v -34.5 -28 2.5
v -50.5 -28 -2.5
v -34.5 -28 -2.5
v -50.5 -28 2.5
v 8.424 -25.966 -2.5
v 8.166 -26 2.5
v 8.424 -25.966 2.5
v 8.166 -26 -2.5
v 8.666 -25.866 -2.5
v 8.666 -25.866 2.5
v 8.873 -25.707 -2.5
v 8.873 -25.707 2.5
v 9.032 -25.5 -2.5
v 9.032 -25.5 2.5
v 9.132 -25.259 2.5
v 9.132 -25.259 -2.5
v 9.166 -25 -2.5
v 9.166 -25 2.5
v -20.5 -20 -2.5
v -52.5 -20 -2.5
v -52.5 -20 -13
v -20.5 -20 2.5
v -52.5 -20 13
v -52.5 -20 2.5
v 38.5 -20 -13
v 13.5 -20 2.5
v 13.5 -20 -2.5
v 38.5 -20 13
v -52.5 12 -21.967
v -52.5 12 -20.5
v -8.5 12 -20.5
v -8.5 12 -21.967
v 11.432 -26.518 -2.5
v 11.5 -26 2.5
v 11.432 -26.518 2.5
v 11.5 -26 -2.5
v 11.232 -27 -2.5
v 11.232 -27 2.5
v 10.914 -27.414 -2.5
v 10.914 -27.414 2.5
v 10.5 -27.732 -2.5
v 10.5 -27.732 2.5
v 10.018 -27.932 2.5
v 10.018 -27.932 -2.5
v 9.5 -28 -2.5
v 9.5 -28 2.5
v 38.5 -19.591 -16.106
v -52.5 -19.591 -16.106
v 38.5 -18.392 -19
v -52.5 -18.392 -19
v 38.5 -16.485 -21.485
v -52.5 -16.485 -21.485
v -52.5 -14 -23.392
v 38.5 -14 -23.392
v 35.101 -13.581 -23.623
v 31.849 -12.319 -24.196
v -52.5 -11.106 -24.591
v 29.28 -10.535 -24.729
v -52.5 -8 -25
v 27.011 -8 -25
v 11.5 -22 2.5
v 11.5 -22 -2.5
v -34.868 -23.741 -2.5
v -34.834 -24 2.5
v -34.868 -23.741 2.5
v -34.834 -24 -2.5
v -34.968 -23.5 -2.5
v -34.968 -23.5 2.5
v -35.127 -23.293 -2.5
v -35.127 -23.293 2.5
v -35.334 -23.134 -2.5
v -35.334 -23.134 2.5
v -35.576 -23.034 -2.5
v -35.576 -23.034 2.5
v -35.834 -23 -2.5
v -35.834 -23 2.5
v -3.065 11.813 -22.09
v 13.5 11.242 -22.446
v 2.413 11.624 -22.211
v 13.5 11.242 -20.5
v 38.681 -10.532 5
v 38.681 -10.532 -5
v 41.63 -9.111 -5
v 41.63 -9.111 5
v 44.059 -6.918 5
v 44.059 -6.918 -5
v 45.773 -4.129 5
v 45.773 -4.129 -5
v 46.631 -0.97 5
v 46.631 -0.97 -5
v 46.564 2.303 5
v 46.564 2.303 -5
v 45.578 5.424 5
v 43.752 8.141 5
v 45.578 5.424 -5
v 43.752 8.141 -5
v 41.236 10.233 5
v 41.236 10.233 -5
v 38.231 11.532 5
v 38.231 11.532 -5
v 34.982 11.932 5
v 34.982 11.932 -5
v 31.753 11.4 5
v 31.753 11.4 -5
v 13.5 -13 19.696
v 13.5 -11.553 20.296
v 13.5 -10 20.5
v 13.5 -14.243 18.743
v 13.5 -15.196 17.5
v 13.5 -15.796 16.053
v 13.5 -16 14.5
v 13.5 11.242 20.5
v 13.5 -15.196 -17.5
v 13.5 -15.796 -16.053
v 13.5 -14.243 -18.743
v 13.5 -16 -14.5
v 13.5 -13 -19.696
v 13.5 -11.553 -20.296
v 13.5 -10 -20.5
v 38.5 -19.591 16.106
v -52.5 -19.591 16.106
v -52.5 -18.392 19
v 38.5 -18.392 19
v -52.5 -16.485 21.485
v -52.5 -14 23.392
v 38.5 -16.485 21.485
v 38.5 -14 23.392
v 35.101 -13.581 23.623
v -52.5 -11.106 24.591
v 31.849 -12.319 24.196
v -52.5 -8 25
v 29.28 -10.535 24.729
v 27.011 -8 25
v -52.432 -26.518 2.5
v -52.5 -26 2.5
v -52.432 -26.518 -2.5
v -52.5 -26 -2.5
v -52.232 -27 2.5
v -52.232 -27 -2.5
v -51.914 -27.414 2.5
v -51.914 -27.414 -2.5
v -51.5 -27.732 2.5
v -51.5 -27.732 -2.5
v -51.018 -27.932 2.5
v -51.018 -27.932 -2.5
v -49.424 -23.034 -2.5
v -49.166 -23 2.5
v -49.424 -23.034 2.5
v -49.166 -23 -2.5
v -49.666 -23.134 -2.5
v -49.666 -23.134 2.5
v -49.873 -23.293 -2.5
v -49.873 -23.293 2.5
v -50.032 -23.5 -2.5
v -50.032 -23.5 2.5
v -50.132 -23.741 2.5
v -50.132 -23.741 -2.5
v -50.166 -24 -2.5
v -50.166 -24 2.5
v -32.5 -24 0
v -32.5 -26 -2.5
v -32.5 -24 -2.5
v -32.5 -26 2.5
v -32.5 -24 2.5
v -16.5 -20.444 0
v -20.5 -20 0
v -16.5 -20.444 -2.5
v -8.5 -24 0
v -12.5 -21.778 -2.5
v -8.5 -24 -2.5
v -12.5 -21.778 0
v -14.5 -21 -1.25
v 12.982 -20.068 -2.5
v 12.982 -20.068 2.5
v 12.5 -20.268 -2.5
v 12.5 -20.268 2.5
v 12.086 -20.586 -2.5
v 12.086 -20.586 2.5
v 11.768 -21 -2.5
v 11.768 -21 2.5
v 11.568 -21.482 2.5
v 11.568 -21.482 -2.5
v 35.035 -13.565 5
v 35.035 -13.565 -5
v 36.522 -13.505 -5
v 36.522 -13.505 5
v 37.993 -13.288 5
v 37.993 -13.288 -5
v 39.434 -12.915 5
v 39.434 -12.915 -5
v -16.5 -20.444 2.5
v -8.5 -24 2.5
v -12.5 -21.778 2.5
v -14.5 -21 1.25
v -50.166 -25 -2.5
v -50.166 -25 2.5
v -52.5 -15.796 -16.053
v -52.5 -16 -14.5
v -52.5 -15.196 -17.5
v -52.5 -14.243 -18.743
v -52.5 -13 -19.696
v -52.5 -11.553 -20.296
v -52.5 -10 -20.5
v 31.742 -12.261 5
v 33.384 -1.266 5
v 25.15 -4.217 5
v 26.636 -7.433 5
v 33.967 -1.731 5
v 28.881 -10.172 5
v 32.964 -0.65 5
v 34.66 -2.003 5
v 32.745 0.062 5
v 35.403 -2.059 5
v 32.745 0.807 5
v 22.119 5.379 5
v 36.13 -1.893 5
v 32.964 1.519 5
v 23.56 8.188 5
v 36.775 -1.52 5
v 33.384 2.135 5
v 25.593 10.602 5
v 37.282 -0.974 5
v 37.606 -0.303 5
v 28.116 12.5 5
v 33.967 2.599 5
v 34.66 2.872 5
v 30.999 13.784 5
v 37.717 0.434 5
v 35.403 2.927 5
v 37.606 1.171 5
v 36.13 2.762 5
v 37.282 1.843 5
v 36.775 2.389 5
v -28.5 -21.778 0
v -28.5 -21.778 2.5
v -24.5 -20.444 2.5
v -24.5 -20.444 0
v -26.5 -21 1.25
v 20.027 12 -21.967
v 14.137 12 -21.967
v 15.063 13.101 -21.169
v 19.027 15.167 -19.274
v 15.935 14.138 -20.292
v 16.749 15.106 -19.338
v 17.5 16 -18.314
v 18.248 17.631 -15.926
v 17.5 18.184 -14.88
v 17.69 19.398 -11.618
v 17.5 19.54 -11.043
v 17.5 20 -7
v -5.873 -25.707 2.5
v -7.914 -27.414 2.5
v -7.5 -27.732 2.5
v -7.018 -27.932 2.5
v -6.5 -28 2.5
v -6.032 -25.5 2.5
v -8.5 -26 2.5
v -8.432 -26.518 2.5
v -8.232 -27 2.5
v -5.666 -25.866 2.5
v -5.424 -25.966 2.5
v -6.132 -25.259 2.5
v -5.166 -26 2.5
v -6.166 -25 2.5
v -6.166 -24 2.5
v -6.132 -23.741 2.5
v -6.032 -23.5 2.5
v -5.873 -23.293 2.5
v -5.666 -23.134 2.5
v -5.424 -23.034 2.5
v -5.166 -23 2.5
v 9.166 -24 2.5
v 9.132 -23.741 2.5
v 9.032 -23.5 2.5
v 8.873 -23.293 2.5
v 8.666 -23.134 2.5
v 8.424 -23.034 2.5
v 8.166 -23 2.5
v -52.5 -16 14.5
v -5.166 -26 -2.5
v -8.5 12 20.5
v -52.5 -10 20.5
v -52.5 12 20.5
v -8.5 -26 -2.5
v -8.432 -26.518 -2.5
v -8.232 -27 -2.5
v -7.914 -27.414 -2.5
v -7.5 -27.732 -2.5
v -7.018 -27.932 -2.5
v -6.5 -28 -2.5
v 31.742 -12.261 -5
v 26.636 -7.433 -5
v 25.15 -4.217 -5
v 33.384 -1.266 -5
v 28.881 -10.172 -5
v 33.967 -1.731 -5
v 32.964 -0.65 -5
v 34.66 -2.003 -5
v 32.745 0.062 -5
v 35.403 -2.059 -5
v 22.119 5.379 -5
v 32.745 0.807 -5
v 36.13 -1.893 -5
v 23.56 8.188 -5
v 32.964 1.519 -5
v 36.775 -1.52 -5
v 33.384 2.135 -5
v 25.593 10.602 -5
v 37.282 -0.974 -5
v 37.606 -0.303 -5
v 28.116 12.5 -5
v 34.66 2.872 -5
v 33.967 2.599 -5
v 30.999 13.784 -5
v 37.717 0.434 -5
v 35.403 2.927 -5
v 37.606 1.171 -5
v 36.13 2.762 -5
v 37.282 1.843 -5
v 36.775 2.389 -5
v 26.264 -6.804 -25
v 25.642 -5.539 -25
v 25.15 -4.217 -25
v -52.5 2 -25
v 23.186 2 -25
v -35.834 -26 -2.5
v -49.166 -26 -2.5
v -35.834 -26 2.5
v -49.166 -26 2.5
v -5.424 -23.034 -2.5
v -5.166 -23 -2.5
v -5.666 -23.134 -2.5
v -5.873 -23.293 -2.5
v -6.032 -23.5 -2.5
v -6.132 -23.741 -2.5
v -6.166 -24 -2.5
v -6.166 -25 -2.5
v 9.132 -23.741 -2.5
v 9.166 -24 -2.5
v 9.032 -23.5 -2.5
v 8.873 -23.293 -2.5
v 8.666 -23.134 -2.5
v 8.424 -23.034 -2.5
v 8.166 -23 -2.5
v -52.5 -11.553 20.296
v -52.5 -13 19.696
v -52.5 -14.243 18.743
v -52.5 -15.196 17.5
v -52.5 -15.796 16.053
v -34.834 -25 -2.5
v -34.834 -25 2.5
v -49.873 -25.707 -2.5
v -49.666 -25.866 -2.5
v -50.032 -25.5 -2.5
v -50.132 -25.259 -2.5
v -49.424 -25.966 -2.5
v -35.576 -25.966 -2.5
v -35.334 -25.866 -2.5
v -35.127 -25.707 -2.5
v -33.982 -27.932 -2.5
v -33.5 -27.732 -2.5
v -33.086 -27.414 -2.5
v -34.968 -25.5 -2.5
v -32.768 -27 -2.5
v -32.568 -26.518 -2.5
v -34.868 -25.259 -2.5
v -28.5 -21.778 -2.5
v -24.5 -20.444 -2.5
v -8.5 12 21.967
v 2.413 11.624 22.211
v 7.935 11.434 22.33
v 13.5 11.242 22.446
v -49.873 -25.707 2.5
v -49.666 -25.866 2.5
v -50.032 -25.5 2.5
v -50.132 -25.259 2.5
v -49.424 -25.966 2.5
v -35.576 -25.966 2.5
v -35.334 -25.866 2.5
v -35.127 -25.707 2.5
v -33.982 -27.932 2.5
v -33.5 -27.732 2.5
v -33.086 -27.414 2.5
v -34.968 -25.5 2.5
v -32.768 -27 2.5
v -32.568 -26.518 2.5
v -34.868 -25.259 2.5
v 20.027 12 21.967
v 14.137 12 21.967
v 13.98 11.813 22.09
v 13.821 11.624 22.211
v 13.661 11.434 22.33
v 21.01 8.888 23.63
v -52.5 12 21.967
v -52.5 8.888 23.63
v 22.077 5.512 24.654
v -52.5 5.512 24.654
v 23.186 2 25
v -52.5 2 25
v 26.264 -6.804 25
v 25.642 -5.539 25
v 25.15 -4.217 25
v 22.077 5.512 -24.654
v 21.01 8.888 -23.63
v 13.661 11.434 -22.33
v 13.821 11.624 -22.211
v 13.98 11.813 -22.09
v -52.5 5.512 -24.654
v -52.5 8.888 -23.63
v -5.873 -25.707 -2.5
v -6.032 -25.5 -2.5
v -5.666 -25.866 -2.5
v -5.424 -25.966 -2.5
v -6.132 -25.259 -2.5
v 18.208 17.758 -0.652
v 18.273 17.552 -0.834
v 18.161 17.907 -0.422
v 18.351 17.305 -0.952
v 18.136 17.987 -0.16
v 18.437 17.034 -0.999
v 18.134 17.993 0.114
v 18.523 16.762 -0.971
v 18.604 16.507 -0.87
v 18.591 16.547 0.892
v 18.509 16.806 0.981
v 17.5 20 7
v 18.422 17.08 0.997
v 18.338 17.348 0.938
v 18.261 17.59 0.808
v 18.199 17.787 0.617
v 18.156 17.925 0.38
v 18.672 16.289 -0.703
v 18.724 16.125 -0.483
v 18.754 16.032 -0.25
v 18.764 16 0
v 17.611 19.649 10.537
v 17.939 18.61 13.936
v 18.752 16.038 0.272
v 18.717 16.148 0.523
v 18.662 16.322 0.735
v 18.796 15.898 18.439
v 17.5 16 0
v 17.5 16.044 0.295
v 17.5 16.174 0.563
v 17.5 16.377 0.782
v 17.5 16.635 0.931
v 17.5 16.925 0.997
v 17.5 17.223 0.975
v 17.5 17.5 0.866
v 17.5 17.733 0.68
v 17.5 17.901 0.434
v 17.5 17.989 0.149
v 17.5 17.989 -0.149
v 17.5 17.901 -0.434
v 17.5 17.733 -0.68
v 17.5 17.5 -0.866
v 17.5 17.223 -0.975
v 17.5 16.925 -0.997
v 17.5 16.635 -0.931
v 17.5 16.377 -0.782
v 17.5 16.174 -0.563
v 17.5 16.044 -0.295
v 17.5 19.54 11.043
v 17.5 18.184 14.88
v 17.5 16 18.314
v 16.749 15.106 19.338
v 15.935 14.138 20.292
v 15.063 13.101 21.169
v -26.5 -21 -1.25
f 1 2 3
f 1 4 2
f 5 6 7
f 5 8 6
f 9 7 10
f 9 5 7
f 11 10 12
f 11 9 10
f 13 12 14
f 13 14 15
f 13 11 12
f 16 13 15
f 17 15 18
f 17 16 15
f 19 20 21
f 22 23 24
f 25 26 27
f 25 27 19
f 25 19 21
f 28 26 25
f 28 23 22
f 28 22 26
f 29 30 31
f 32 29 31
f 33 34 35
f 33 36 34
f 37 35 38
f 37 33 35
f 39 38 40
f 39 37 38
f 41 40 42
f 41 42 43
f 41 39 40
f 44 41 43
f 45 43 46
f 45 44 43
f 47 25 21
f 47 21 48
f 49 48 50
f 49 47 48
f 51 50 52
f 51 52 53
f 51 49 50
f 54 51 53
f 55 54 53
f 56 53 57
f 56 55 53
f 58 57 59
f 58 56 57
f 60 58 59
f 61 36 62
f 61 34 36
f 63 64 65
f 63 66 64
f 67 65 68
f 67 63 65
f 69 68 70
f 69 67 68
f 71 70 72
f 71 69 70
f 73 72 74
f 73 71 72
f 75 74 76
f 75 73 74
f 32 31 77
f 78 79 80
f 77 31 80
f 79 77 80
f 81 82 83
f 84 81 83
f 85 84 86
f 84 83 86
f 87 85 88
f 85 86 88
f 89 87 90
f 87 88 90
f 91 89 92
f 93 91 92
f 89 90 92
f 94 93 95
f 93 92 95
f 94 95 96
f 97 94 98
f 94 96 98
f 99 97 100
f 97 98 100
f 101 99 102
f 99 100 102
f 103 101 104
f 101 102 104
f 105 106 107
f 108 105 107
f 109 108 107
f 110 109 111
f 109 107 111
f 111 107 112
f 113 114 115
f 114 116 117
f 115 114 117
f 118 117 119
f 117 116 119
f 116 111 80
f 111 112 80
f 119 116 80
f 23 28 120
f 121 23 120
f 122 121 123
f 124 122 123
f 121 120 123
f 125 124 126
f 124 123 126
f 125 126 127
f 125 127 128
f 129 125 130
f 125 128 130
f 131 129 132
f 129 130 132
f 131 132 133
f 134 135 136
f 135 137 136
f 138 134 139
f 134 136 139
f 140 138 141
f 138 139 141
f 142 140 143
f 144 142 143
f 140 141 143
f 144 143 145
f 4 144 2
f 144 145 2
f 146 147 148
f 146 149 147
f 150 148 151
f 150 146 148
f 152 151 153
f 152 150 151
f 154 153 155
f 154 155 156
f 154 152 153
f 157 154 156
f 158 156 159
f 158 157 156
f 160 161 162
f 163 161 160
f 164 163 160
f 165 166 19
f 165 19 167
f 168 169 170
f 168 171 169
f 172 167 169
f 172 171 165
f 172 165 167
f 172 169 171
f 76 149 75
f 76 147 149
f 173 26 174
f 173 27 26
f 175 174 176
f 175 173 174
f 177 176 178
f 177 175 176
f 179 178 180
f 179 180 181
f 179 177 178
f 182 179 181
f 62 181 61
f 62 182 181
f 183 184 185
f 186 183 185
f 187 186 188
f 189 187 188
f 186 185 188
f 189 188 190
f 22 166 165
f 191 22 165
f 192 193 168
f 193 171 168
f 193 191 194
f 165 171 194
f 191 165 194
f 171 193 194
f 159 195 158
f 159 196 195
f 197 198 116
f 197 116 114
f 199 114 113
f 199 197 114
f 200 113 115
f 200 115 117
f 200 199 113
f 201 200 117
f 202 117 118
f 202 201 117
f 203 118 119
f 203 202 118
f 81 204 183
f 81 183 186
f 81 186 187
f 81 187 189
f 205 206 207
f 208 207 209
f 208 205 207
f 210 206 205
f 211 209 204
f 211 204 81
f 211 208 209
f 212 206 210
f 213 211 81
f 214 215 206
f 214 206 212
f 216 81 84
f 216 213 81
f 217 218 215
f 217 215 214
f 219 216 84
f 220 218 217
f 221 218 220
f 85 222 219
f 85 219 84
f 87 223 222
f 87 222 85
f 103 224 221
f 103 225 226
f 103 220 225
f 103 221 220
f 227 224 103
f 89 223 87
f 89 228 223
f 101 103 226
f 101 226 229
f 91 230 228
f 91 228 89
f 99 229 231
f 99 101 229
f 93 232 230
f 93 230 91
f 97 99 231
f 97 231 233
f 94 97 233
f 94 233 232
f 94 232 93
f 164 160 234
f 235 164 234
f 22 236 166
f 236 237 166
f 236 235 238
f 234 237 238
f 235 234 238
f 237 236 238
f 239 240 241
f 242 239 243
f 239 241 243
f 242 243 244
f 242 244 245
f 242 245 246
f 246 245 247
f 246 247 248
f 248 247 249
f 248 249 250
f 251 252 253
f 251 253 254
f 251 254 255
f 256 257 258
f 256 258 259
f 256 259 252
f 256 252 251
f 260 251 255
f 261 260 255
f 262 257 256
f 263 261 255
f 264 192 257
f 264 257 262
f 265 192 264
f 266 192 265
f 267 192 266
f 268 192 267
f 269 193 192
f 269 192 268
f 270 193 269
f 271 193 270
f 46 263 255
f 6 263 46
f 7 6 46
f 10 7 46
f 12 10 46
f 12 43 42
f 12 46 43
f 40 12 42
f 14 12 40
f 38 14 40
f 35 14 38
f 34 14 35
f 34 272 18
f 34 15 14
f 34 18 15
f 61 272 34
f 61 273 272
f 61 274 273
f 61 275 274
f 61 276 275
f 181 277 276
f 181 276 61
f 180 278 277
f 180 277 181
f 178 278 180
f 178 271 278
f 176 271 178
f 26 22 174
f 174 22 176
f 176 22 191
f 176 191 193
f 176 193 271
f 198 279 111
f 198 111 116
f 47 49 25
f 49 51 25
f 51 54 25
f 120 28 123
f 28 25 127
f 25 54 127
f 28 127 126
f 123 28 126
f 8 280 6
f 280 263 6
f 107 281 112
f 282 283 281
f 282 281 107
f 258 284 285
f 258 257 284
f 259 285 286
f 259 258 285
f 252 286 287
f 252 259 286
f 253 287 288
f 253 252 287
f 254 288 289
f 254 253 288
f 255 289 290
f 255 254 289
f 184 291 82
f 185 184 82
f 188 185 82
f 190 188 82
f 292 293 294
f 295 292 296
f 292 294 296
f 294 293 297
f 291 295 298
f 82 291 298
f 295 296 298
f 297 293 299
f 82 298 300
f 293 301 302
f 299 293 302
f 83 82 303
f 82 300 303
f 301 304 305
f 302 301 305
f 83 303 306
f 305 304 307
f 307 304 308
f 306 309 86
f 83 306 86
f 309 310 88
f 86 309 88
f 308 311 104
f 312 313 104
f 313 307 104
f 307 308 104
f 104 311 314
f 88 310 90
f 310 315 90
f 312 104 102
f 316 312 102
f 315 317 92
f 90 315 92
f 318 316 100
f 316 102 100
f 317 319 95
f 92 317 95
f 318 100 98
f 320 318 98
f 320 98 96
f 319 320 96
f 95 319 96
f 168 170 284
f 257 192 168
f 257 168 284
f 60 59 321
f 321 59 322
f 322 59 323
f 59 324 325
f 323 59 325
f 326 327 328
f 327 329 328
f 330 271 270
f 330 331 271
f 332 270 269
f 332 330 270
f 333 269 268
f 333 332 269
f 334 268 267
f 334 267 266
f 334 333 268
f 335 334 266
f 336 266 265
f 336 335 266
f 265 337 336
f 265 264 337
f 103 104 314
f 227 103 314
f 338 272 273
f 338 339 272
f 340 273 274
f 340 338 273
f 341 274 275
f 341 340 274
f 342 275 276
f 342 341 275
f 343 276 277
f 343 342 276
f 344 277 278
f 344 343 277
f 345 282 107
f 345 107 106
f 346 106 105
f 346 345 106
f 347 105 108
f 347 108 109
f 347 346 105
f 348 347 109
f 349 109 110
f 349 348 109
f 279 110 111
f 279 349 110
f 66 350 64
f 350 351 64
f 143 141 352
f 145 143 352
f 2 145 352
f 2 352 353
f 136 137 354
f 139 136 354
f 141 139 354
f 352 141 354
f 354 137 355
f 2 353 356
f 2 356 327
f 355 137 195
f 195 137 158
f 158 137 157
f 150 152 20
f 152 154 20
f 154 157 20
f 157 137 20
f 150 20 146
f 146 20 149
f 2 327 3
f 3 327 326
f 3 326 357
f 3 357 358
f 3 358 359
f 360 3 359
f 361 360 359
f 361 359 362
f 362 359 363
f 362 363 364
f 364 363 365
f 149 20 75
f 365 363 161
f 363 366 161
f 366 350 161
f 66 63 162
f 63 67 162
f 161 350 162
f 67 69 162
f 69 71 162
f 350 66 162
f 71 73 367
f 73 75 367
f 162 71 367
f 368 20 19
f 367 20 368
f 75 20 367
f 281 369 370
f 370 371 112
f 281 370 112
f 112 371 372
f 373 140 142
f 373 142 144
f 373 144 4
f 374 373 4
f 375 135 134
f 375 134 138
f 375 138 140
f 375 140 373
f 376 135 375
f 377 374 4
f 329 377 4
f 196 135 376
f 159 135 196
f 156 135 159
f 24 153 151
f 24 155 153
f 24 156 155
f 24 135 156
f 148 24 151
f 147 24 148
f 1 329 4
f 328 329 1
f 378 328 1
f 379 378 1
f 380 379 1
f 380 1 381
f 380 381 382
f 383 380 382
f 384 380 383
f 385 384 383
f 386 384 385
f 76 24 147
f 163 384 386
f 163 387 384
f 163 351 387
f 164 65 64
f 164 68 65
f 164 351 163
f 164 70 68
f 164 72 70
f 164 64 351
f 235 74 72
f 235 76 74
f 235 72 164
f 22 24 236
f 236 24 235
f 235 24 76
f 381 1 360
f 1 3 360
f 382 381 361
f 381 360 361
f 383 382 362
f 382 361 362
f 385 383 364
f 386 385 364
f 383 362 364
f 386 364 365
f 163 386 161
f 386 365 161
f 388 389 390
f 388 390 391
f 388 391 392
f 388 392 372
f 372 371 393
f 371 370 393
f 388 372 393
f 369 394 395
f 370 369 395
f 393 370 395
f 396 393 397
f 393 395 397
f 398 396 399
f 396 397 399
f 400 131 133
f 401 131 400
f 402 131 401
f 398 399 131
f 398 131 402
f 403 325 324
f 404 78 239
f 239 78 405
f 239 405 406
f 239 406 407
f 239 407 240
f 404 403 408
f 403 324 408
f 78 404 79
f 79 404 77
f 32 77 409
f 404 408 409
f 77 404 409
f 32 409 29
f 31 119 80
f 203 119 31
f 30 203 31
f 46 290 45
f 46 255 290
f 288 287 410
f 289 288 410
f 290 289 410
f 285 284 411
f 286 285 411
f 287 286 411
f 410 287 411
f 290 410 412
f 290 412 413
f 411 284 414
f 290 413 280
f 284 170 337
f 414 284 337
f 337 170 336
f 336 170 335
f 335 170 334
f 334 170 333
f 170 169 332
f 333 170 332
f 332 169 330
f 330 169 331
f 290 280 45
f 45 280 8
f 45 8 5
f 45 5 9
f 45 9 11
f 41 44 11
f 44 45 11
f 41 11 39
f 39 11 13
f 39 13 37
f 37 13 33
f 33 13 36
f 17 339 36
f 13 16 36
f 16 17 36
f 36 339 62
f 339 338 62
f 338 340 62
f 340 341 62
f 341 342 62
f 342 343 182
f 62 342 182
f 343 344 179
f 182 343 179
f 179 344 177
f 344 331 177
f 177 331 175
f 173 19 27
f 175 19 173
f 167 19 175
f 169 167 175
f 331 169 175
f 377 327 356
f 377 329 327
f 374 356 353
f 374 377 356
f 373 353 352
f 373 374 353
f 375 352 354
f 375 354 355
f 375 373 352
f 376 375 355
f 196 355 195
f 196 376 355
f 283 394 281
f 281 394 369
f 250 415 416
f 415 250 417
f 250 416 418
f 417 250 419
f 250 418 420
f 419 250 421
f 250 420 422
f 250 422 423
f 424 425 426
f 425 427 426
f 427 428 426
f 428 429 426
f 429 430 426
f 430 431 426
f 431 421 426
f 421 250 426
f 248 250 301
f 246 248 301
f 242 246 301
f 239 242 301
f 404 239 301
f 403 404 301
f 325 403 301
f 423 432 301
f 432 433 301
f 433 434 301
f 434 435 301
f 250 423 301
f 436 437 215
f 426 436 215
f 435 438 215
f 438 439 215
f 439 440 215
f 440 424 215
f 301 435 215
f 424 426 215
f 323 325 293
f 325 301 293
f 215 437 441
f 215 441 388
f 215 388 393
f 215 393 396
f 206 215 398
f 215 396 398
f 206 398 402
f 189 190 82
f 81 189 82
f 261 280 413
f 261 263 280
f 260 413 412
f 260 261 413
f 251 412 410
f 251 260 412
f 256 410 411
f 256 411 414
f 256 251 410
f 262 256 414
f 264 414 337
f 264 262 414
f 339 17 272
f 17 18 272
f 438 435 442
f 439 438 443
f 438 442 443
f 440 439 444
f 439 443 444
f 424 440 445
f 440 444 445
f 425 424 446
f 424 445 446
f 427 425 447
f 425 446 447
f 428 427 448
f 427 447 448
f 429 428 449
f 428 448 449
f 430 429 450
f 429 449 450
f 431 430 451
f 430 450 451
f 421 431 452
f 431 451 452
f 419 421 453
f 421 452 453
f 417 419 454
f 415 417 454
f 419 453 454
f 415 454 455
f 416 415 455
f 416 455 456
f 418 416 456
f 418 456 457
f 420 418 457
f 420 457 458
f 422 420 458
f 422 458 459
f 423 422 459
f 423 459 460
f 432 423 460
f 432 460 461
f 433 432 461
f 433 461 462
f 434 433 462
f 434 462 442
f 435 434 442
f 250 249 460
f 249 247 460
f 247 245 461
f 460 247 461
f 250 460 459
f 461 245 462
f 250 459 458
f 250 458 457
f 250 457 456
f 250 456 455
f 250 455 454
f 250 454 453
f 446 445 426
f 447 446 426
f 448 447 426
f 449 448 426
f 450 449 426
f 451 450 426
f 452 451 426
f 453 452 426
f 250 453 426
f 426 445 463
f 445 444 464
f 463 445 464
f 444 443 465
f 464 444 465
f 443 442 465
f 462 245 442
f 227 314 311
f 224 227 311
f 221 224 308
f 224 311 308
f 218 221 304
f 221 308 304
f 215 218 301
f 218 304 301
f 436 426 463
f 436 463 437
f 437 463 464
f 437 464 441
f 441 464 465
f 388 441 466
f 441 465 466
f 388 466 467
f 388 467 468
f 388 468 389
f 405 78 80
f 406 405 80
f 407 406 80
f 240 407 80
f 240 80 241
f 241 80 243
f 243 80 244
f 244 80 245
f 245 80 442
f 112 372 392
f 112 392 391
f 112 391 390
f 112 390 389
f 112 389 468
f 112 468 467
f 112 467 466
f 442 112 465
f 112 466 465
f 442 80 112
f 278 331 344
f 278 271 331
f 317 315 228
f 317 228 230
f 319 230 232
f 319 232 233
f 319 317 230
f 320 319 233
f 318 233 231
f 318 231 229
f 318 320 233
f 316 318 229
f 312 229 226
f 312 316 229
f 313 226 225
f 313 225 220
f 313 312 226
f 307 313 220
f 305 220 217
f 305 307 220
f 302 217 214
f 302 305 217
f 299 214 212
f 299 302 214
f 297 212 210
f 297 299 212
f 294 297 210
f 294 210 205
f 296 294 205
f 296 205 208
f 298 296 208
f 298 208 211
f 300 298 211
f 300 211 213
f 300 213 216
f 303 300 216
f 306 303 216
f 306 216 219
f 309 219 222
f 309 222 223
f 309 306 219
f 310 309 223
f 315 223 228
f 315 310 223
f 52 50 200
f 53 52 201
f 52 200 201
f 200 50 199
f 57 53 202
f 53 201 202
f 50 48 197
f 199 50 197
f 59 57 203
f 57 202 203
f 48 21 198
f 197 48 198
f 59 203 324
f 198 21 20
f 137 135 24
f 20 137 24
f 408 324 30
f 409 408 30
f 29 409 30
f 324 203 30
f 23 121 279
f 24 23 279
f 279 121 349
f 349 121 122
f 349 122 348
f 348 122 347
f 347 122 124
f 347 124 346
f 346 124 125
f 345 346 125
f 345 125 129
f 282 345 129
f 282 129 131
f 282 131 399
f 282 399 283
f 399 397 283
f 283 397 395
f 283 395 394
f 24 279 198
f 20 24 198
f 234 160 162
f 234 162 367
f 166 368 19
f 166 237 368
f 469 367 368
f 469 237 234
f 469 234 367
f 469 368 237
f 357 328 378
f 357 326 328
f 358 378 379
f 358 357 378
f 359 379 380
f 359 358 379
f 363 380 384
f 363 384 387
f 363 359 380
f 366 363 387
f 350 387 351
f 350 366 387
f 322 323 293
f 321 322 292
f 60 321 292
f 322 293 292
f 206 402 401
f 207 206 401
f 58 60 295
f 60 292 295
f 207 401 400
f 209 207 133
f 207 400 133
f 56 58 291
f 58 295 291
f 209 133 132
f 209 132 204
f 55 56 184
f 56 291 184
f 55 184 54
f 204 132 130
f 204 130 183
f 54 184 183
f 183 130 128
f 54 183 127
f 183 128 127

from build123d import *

# Parameters (mm, degrees)
CROQUIS1_W              = 105
CROQUIS1_H              = 40
SALIENTE_EXTRUIR1_DEPTH = 25
CORTAR_EXTRUIR1_DEPTH   = 50
CORTAR_EXTRUIR2_DEPTH   = 50
CROQUIS6_R              = 2.5
SALIENTE_EXTRUIR3_DEPTH = 5
CORTAR_EXTRUIR3_DEPTH   = 76.208044782
REDONDEO2_R             = 12
CORTAR_EXTRUIR4_DEPTH   = 110
CORTAR_EXTRUIR5_DEPTH   = 66
CROQUIS12_W             = 20
CROQUIS12_H             = 8
CROQUIS12_W_2           = 15.331196302
CROQUIS12_H_2           = 3
SALIENTE_EXTRUIR4_DEPTH = 2.5
CROQUIS13_R             = 1
CORTAR_EXTRUIR6_DEPTH   = 10
REDONDEO3_R             = 2
REDONDEO4_R             = 2
REDONDEO5_R             = 1


with BuildPart() as part:
    # Croquis1 → Saliente-Extruir1 (new, symmetric)
    with BuildSketch(Plane.XY):
        Rectangle(CROQUIS1_W, CROQUIS1_H)
    extrude(amount=SALIENTE_EXTRUIR1_DEPTH, both=True)

    # Croquis2 → Cortar-Extruir1 (cut)
    with BuildSketch(Plane.XY.offset(25)):
        Polygon((-52.5, 20), (-52.5, 12), (-46.5, 12), (-26.5, 12), (-8.5, 12), (13.5, 11.241881844), (17.5, 16), (17.5, 20), align=None)
    extrude(amount=-CORTAR_EXTRUIR1_DEPTH, mode=Mode.SUBTRACT)

    # Croquis5 → Cortar-Extruir2 (cut)
    with BuildSketch(Plane.XY.offset(25)):
        with BuildLine():
            Line((52.5, 20), (17.5, 20))
            Line((17.5, 20), (25.150275796, -4.217210414))
            ThreePointArc((25.150275796, -4.217210414), (40.633525386, -13.836476048), (52.5, 0))
            Line((52.5, 0), (52.5, 20))
        make_face()
    extrude(amount=-CORTAR_EXTRUIR2_DEPTH, mode=Mode.SUBTRACT)

    # Croquis6 → Saliente-Extruir3 (add, symmetric)
    with BuildSketch(Plane.XY):
        with BuildLine():
            Line((39.433873902, -12.915399918), (38.680800614, -10.531520596))
            ThreePointArc((38.680800614, -10.531520596), (46.18250837, 3.898461412), (31.752526362, 11.400169168))
            Line((31.752526362, 11.400169168), (30.999453074, 13.78404849))
            ThreePointArc((30.999453074, 13.78404849), (21.866939284, -3.782886128), (39.433873902, -12.915399918))
        make_face()
        with Locations((35.216663488, 0.434324286)):
            Circle(CROQUIS6_R, mode=Mode.SUBTRACT)
    extrude(amount=SALIENTE_EXTRUIR3_DEPTH, both=True)

    # Croquis8 → Cortar-Extruir3 (cut, through all)
    with BuildSketch(Plane.XY.offset(25)):
        with BuildLine():
            Line((38.5, -14), (38.5, -20))
            Line((38.5, -20), (52.5, -20))
            Line((52.5, -20), (52.5, 0))
            ThreePointArc((52.5, 0), (48.399494937, -9.899494937), (38.5, -14))
        make_face()
    extrude(amount=-CORTAR_EXTRUIR3_DEPTH, mode=Mode.SUBTRACT)

    # Redondeo2
    redondeo2_edges = [part.edges().sort_by_distance(p)[0] for p in [
        (-7, -20, -25),
        (-7, -20, 25),
    ]]
    fillet(redondeo2_edges, radius=REDONDEO2_R)

    # Croquis10 → Cortar-Extruir4 (cut)
    with BuildSketch(Plane.ZY.offset(52.5)):
        with BuildLine():
            Line((25, 32), (-25, 32))
            Line((-25, 32), (-25, 2))
            ThreePointArc((-25, 2), (-19.727922061, 14.727922061), (-7, 20))
            Line((-7, 20), (7, 20))
            ThreePointArc((7, 20), (19.727922061, 14.727922061), (25, 2))
            Line((25, 2), (25, 32))
        make_face()
    extrude(amount=-CORTAR_EXTRUIR4_DEPTH, mode=Mode.SUBTRACT)

    # Croquis11 → Cortar-Extruir5 (cut)
    with BuildSketch(Plane.ZY.offset(52.5)):
        with BuildLine():
            Line((20.5, 23.772379217), (-20.5, 23.772379217))
            Line((-20.5, 23.772379217), (-20.5, -10))
            ThreePointArc((-20.5, -10), (-18.742640687, -14.242640687), (-14.5, -16))
            Line((-14.5, -16), (14.5, -16))
            ThreePointArc((14.5, -16), (18.742640687, -14.242640687), (20.5, -10))
            Line((20.5, -10), (20.5, 23.772379217))
        make_face()
    extrude(amount=-CORTAR_EXTRUIR5_DEPTH, mode=Mode.SUBTRACT)

    # Croquis12 → Saliente-Extruir4 (add, symmetric)
    # profile 1 of 4: a face of its own
    with BuildSketch(Plane.XY):
        with Locations((-42.5, -24)):
            Rectangle(CROQUIS12_W, CROQUIS12_H)
        with Locations((-42.5, -24.5)):
            Rectangle(CROQUIS12_W_2, CROQUIS12_H_2, mode=Mode.SUBTRACT)
    # profile 2 of 4: a face of its own
    with BuildSketch(Plane.XY):
        Polygon((11.5, -20), (-8.5, -20), (-8.5, -24), (-8.5, -28), (11.5, -28), align=None)
        with Locations((1.5, -24.5)):
            Rectangle(CROQUIS12_W_2, CROQUIS12_H_2, mode=Mode.SUBTRACT)
    # profile 3 of 4: a face of its own
    with BuildSketch(Plane.XY):
        with BuildLine():
            Line((-32.5, -20), (-32.5, -24))
            add(Edge.make_bspline(
                [(-32.5, -24), (-26.5, -20), (-20.5, -20)],
                knots=[0, 0, 0, 0.5, 0.5, 0.5], degree=2))
            Line((-20.5, -20), (-32.5, -20))
        make_face()
    # profile 4 of 4: a face of its own
    with BuildSketch(Plane.XY):
        with BuildLine():
            Line((-8.5, -20), (-20.5, -20))
            add(Edge.make_bspline(
                [(-20.5, -20), (-14.5, -20), (-8.5, -24)],
                knots=[0.5, 0.5, 0.5, 1, 1, 1], degree=2))
            Line((-8.5, -24), (-8.5, -20))
        make_face()
    extrude(amount=SALIENTE_EXTRUIR4_DEPTH, both=True)

    # Croquis13 → Cortar-Extruir6 (cut)
    with BuildSketch(Plane.ZY.offset(-17.5)):
        with Locations((0, 17)):
            Circle(CROQUIS13_R)
    extrude(amount=-CORTAR_EXTRUIR6_DEPTH, mode=Mode.SUBTRACT)

    # Redondeo3
    redondeo3_edges = [part.edges().sort_by_distance(p)[0] for p in [
        (-8.5, -28, 0),
        (-52.5, -28, 0),
        (-32.5, -28, 0),
        (11.5, -28, 0),
    ]]
    fillet(redondeo3_edges, radius=REDONDEO3_R)

    # Redondeo4
    redondeo4_edges = [part.edges().sort_by_distance(p)[0] for p in [
        (11.5, -20, 0),
    ]]
    fillet(redondeo4_edges, radius=REDONDEO4_R)

    # Redondeo5
    redondeo5_edges = [part.edges().sort_by_distance(p)[0] for p in [
        (-34.834401849, -26, 0),
        (-50.165598151, -26, 0),
        (-50.165598151, -23, 0),
        (-34.834401849, -23, 0),
        (-6.165598151, -26, 0),
        (-6.165598151, -23, 0),
        (9.165598151, -26, 0),
        (9.165598151, -23, 0),
    ]]
    fillet(redondeo5_edges, radius=REDONDEO5_R)


solid = part.part
